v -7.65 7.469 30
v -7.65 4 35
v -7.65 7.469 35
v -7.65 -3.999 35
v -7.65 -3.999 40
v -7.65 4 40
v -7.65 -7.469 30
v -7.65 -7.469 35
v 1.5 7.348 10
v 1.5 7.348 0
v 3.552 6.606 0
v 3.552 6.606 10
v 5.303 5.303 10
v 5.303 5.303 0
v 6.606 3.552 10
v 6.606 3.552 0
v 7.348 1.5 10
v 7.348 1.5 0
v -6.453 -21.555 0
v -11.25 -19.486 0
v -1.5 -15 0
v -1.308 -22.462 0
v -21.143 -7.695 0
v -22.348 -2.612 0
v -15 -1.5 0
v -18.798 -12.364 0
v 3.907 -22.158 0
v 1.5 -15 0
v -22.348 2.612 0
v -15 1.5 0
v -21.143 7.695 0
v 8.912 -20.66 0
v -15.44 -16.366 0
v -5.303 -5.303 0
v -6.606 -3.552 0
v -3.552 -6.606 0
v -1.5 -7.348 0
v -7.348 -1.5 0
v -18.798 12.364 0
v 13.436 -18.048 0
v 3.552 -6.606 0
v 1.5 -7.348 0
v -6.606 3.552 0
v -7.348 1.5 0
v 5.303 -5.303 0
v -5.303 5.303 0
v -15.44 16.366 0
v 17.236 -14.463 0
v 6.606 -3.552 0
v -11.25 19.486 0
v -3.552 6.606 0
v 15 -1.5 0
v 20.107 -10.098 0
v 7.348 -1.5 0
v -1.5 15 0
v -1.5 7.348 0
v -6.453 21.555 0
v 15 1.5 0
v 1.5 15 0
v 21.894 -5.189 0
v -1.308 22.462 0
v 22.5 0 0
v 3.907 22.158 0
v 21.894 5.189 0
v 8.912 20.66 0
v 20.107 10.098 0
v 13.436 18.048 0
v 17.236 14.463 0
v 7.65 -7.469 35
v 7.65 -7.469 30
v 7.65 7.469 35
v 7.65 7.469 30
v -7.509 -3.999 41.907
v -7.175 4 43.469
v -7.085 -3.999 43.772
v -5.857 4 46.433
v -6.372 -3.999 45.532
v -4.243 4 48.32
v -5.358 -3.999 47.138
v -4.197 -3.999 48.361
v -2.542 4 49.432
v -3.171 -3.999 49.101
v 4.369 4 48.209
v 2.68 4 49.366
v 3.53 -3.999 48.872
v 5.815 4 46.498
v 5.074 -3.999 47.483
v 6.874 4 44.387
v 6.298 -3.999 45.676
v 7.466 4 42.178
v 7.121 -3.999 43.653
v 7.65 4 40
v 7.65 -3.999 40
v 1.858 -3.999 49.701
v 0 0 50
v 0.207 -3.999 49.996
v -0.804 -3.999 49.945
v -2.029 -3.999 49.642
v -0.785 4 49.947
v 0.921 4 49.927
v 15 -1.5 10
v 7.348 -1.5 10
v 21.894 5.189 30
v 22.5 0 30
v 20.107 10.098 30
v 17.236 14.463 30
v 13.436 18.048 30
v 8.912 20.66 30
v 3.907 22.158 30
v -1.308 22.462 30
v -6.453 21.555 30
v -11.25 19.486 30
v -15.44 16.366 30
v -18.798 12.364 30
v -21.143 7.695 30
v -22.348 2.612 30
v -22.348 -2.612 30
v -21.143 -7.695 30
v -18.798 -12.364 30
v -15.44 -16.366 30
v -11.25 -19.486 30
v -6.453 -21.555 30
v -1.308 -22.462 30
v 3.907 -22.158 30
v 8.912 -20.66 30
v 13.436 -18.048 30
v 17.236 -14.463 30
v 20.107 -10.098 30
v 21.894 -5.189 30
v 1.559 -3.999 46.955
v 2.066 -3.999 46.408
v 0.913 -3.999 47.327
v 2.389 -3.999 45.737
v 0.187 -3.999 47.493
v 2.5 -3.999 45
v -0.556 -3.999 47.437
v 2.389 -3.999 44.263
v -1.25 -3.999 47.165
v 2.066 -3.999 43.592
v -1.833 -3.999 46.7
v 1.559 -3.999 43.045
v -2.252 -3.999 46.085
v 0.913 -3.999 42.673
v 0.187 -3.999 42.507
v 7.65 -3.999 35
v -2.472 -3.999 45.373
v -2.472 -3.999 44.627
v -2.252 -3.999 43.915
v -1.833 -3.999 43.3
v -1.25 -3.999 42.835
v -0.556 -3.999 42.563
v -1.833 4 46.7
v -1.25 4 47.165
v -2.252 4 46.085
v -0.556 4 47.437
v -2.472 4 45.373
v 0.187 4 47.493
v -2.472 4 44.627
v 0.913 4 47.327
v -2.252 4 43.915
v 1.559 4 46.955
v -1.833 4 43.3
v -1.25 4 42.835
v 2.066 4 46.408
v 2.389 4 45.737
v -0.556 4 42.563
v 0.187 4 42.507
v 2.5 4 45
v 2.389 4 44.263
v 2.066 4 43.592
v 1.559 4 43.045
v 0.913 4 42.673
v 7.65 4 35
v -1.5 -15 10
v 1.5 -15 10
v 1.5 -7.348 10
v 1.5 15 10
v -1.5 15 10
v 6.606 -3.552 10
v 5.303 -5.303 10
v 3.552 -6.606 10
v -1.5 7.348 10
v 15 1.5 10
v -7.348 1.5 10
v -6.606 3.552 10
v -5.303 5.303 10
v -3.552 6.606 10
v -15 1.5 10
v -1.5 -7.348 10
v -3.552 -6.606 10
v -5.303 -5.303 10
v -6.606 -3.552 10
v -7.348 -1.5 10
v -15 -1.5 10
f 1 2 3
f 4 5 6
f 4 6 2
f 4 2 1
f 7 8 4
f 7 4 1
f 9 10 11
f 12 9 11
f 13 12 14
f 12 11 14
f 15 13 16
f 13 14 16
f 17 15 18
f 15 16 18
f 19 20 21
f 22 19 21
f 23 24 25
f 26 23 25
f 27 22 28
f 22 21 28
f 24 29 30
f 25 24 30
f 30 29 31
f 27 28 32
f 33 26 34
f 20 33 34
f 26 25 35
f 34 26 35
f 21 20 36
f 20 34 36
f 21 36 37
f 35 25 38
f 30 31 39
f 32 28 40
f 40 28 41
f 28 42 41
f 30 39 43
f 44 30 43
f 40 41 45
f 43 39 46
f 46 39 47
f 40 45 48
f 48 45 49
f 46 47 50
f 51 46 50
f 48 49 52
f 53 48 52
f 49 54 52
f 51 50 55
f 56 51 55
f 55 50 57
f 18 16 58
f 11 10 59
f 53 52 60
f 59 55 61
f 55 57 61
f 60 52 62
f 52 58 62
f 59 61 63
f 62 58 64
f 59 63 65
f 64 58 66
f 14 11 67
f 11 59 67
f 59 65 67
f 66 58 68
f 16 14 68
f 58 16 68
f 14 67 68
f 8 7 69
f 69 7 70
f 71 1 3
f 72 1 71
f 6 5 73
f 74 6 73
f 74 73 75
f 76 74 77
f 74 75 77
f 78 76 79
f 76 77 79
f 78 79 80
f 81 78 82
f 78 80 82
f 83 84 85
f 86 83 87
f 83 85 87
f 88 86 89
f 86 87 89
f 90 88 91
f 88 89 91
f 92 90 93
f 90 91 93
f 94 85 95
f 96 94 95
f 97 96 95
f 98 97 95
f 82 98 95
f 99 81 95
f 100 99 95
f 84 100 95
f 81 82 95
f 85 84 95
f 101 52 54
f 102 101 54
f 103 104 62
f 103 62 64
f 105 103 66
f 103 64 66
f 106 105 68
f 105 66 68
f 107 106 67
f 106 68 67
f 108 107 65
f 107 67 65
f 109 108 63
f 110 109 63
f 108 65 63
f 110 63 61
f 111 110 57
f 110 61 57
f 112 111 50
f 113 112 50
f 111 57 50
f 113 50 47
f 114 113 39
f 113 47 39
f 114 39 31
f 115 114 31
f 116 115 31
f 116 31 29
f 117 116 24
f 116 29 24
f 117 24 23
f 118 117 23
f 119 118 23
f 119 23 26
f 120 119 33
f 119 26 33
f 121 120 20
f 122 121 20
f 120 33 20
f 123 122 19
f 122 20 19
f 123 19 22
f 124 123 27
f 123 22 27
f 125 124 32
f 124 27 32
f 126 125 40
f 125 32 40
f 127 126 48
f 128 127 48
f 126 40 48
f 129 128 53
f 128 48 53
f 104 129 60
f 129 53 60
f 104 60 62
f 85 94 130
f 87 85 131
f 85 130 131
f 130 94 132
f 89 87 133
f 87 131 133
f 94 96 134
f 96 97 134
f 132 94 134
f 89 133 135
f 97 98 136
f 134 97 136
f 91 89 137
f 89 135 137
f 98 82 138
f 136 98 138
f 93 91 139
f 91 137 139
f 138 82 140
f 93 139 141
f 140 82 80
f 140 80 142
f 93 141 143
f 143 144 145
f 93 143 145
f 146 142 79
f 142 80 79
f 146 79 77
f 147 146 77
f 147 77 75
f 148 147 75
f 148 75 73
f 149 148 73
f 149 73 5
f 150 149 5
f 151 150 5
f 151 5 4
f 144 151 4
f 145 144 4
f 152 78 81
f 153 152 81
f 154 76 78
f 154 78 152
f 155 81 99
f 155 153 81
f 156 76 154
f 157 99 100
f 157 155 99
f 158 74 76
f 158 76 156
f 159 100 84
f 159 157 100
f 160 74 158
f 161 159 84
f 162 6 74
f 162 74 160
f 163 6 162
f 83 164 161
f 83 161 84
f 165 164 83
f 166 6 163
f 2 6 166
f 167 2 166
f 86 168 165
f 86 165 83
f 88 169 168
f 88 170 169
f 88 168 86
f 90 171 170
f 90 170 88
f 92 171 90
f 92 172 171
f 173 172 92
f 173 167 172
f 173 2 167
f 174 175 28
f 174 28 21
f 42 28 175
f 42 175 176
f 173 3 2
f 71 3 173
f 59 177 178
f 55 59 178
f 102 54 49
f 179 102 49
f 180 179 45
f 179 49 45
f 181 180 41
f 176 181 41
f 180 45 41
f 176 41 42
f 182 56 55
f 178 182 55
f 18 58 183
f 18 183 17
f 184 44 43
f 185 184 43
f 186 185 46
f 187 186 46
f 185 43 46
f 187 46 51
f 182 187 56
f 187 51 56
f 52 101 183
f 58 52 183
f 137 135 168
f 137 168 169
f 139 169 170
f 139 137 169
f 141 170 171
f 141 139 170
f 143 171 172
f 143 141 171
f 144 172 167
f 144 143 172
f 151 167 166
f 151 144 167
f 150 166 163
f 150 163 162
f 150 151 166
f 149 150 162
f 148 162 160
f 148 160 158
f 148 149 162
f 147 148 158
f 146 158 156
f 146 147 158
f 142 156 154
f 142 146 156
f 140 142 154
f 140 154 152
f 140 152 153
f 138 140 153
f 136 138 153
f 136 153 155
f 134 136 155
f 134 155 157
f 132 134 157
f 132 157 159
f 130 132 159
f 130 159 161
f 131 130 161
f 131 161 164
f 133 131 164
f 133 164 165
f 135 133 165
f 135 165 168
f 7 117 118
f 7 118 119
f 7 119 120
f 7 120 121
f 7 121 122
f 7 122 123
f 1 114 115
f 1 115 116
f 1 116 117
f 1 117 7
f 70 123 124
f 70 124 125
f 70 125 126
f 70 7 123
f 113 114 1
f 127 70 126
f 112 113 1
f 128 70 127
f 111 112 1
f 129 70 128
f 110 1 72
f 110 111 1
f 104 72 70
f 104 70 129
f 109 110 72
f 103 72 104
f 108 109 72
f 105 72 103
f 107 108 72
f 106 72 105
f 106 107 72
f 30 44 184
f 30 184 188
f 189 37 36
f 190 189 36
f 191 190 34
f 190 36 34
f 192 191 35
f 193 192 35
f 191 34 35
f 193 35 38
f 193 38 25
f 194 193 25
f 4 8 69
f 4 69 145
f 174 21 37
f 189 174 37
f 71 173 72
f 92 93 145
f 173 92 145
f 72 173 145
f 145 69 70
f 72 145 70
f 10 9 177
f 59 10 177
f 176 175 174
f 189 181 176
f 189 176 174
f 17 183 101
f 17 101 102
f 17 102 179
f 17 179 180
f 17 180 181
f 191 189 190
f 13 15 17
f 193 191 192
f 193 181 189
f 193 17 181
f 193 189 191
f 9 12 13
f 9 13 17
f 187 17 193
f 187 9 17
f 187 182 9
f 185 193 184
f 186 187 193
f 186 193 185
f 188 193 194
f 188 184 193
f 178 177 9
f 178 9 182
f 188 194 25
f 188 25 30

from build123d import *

# Parameters (mm, degrees)
SKETCH1_R               = 22.5
BOSS_EXTRUDE1_DEPTH     = 30
SKETCH2_R               = 7.5
SKETCH2_W               = 3
SKETCH2_H               = 30
SKETCH2_W_2             = 30
SKETCH2_H_2             = 3
CUT_EXTRUDE1_DEPTH      = 10
SKETCH3_W               = 15.299534312
SKETCH3_H               = 14.93812799
BOSS_EXTRUDE2_DEPTH     = 20
CUT_EXTRUDE2_DEPTH      = 20
SKETCH5_R               = 2.5
CUT_EXTRUDE4_DEPTH      = 20
SKETCH10_W              = 15.299534312
SKETCH10_H              = 5
CUT_EXTRUDE5_DEPTH      = 23
CUT_EXTRUDE5_DEPTH_BACK = 11.4
SKETCH11_W              = 15.299534312
SKETCH11_H              = 5
SKETCH11_R              = 2.5
BOSS_EXTRUDE3_DEPTH     = 8
SKETCH13_W              = 10
SKETCH13_H              = 3.47
SKETCH13_W_2            = 5
CUT_EXTRUDE6_DEPTH      = 21


with BuildPart() as part:
    # Sketch1 → Boss-Extrude1 (new body)
    with BuildSketch(Plane.XY):
        Circle(SKETCH1_R)
    extrude(amount=BOSS_EXTRUDE1_DEPTH)

    # Sketch2 → Cut-Extrude1 (cut)
    with BuildSketch(Plane(origin=(0, 0, 0), x_dir=(-1, 0, 0), z_dir=(0, 0, -1))):
        Circle(SKETCH2_R)
        Rectangle(SKETCH2_W, SKETCH2_H)
        Rectangle(SKETCH2_W_2, SKETCH2_H_2)
    extrude(amount=-CUT_EXTRUDE1_DEPTH, mode=Mode.SUBTRACT)

    # Sketch3 → Boss-Extrude2 (add)
    with BuildSketch(Plane.XY.offset(30)):
        Rectangle(SKETCH3_W, SKETCH3_H)
    extrude(amount=BOSS_EXTRUDE2_DEPTH)

    # Sketch4 → Cut-Extrude2 (cut)
    with BuildSketch(Plane.ZY.offset(7.649767156)):
        Polygon((40, 4), (50, 4), (50, 0), (50, -4), (40, -4), (35, -4), (35, 4), align=None)
    extrude(amount=-CUT_EXTRUDE2_DEPTH, mode=Mode.SUBTRACT)

    # Sketch5 → Cut-Extrude4 (cut)
    with BuildSketch(Plane(origin=(0, 7.469063995, 0), x_dir=(1, 0, 0), z_dir=(0, 1, 0))):
        with Locations((0, -45)):
            Circle(SKETCH5_R)
        with BuildLine():
            Line((7.649767156, -50), (7.649767156, -40))
            add(Edge.make_bspline(
                [(0, -50), (7.649767156, -50), (7.649767156, -40)],
                knots=[3.141592654, 3.141592654, 3.141592654, 4.71238898, 4.71238898, 4.71238898], degree=2, weights=[1, 0.707106781, 1]))
            Line((0, -50), (7.649767156, -50))
        make_face()
        with BuildLine():
            Line((-7.649767156, -50), (0, -50))
            add(Edge.make_bspline(
                [(-7.649767156, -40), (-7.649767156, -50), (0, -50)],
                knots=[1.570796327, 1.570796327, 1.570796327, 3.141592654, 3.141592654, 3.141592654], degree=2, weights=[1, 0.707106781, 1]))
            Line((-7.649767156, -40), (-7.649767156, -50))
        make_face()
    extrude(amount=-CUT_EXTRUDE4_DEPTH, mode=Mode.SUBTRACT)

    # Sketch10 → Cut-Extrude5 (cut, two sides)
    with BuildSketch(Plane(origin=(0, 7.469063995, 0), x_dir=(1, 0, 0), z_dir=(0, 1, 0))) as cut_extrude5_sk:
        with Locations((0, -37.5)):
            Rectangle(SKETCH10_W, SKETCH10_H)
        with BuildLine():
            Line((7.649767156, -40), (-7.649767156, -40))
            add(Edge.make_bspline(
                [(-7.649767156, -40), (-7.649767156, -50), (0, -50), (7.649767156, -50), (7.649767156, -40)],
                knots=[4.71238898, 4.71238898, 4.71238898, 6.283185307, 6.283185307, 7.853981634, 7.853981634, 7.853981634], degree=2, weights=[1, 0.707106781, 1, 0.707106781, 1]))
        make_face()
    extrude(amount=CUT_EXTRUDE5_DEPTH, mode=Mode.SUBTRACT)
    extrude(cut_extrude5_sk.sketch, amount=-CUT_EXTRUDE5_DEPTH_BACK, mode=Mode.SUBTRACT)

    # Sketch11 → Boss-Extrude3 (add)
    with BuildSketch(Plane(origin=(0, -4, 0), x_dir=(1, 0, 0), z_dir=(0, 1, 0))):
        with Locations((0, -37.5)):
            Rectangle(SKETCH11_W, SKETCH11_H)
        with BuildLine():
            Line((7.649767156, -40), (-7.649767156, -40))
            add(Edge.make_bspline(
                [(-7.649767156, -40), (-7.649767156, -50), (0, -50), (7.649767156, -50), (7.649767156, -40)],
                knots=[4.71238898, 4.71238898, 4.71238898, 6.283185307, 6.283185307, 7.853981634, 7.853981634, 7.853981634], degree=2, weights=[1, 0.707106781, 1, 0.707106781, 1]))
        make_face()
        with Locations((0, -45)):
            Circle(SKETCH11_R, mode=Mode.SUBTRACT)
    extrude(amount=BOSS_EXTRUDE3_DEPTH)

    # Sketch13 → Cut-Extrude6 (cut)
    with BuildSketch(Plane.ZY.offset(7.649767156)):
        with Locations((45, -5.734063995)):
            Rectangle(SKETCH13_W, SKETCH13_H)
        with Locations((37.5, -5.734063995)):
            Rectangle(SKETCH13_W_2, SKETCH13_H)
    extrude(amount=-CUT_EXTRUDE6_DEPTH, mode=Mode.SUBTRACT)


solid = part.part
